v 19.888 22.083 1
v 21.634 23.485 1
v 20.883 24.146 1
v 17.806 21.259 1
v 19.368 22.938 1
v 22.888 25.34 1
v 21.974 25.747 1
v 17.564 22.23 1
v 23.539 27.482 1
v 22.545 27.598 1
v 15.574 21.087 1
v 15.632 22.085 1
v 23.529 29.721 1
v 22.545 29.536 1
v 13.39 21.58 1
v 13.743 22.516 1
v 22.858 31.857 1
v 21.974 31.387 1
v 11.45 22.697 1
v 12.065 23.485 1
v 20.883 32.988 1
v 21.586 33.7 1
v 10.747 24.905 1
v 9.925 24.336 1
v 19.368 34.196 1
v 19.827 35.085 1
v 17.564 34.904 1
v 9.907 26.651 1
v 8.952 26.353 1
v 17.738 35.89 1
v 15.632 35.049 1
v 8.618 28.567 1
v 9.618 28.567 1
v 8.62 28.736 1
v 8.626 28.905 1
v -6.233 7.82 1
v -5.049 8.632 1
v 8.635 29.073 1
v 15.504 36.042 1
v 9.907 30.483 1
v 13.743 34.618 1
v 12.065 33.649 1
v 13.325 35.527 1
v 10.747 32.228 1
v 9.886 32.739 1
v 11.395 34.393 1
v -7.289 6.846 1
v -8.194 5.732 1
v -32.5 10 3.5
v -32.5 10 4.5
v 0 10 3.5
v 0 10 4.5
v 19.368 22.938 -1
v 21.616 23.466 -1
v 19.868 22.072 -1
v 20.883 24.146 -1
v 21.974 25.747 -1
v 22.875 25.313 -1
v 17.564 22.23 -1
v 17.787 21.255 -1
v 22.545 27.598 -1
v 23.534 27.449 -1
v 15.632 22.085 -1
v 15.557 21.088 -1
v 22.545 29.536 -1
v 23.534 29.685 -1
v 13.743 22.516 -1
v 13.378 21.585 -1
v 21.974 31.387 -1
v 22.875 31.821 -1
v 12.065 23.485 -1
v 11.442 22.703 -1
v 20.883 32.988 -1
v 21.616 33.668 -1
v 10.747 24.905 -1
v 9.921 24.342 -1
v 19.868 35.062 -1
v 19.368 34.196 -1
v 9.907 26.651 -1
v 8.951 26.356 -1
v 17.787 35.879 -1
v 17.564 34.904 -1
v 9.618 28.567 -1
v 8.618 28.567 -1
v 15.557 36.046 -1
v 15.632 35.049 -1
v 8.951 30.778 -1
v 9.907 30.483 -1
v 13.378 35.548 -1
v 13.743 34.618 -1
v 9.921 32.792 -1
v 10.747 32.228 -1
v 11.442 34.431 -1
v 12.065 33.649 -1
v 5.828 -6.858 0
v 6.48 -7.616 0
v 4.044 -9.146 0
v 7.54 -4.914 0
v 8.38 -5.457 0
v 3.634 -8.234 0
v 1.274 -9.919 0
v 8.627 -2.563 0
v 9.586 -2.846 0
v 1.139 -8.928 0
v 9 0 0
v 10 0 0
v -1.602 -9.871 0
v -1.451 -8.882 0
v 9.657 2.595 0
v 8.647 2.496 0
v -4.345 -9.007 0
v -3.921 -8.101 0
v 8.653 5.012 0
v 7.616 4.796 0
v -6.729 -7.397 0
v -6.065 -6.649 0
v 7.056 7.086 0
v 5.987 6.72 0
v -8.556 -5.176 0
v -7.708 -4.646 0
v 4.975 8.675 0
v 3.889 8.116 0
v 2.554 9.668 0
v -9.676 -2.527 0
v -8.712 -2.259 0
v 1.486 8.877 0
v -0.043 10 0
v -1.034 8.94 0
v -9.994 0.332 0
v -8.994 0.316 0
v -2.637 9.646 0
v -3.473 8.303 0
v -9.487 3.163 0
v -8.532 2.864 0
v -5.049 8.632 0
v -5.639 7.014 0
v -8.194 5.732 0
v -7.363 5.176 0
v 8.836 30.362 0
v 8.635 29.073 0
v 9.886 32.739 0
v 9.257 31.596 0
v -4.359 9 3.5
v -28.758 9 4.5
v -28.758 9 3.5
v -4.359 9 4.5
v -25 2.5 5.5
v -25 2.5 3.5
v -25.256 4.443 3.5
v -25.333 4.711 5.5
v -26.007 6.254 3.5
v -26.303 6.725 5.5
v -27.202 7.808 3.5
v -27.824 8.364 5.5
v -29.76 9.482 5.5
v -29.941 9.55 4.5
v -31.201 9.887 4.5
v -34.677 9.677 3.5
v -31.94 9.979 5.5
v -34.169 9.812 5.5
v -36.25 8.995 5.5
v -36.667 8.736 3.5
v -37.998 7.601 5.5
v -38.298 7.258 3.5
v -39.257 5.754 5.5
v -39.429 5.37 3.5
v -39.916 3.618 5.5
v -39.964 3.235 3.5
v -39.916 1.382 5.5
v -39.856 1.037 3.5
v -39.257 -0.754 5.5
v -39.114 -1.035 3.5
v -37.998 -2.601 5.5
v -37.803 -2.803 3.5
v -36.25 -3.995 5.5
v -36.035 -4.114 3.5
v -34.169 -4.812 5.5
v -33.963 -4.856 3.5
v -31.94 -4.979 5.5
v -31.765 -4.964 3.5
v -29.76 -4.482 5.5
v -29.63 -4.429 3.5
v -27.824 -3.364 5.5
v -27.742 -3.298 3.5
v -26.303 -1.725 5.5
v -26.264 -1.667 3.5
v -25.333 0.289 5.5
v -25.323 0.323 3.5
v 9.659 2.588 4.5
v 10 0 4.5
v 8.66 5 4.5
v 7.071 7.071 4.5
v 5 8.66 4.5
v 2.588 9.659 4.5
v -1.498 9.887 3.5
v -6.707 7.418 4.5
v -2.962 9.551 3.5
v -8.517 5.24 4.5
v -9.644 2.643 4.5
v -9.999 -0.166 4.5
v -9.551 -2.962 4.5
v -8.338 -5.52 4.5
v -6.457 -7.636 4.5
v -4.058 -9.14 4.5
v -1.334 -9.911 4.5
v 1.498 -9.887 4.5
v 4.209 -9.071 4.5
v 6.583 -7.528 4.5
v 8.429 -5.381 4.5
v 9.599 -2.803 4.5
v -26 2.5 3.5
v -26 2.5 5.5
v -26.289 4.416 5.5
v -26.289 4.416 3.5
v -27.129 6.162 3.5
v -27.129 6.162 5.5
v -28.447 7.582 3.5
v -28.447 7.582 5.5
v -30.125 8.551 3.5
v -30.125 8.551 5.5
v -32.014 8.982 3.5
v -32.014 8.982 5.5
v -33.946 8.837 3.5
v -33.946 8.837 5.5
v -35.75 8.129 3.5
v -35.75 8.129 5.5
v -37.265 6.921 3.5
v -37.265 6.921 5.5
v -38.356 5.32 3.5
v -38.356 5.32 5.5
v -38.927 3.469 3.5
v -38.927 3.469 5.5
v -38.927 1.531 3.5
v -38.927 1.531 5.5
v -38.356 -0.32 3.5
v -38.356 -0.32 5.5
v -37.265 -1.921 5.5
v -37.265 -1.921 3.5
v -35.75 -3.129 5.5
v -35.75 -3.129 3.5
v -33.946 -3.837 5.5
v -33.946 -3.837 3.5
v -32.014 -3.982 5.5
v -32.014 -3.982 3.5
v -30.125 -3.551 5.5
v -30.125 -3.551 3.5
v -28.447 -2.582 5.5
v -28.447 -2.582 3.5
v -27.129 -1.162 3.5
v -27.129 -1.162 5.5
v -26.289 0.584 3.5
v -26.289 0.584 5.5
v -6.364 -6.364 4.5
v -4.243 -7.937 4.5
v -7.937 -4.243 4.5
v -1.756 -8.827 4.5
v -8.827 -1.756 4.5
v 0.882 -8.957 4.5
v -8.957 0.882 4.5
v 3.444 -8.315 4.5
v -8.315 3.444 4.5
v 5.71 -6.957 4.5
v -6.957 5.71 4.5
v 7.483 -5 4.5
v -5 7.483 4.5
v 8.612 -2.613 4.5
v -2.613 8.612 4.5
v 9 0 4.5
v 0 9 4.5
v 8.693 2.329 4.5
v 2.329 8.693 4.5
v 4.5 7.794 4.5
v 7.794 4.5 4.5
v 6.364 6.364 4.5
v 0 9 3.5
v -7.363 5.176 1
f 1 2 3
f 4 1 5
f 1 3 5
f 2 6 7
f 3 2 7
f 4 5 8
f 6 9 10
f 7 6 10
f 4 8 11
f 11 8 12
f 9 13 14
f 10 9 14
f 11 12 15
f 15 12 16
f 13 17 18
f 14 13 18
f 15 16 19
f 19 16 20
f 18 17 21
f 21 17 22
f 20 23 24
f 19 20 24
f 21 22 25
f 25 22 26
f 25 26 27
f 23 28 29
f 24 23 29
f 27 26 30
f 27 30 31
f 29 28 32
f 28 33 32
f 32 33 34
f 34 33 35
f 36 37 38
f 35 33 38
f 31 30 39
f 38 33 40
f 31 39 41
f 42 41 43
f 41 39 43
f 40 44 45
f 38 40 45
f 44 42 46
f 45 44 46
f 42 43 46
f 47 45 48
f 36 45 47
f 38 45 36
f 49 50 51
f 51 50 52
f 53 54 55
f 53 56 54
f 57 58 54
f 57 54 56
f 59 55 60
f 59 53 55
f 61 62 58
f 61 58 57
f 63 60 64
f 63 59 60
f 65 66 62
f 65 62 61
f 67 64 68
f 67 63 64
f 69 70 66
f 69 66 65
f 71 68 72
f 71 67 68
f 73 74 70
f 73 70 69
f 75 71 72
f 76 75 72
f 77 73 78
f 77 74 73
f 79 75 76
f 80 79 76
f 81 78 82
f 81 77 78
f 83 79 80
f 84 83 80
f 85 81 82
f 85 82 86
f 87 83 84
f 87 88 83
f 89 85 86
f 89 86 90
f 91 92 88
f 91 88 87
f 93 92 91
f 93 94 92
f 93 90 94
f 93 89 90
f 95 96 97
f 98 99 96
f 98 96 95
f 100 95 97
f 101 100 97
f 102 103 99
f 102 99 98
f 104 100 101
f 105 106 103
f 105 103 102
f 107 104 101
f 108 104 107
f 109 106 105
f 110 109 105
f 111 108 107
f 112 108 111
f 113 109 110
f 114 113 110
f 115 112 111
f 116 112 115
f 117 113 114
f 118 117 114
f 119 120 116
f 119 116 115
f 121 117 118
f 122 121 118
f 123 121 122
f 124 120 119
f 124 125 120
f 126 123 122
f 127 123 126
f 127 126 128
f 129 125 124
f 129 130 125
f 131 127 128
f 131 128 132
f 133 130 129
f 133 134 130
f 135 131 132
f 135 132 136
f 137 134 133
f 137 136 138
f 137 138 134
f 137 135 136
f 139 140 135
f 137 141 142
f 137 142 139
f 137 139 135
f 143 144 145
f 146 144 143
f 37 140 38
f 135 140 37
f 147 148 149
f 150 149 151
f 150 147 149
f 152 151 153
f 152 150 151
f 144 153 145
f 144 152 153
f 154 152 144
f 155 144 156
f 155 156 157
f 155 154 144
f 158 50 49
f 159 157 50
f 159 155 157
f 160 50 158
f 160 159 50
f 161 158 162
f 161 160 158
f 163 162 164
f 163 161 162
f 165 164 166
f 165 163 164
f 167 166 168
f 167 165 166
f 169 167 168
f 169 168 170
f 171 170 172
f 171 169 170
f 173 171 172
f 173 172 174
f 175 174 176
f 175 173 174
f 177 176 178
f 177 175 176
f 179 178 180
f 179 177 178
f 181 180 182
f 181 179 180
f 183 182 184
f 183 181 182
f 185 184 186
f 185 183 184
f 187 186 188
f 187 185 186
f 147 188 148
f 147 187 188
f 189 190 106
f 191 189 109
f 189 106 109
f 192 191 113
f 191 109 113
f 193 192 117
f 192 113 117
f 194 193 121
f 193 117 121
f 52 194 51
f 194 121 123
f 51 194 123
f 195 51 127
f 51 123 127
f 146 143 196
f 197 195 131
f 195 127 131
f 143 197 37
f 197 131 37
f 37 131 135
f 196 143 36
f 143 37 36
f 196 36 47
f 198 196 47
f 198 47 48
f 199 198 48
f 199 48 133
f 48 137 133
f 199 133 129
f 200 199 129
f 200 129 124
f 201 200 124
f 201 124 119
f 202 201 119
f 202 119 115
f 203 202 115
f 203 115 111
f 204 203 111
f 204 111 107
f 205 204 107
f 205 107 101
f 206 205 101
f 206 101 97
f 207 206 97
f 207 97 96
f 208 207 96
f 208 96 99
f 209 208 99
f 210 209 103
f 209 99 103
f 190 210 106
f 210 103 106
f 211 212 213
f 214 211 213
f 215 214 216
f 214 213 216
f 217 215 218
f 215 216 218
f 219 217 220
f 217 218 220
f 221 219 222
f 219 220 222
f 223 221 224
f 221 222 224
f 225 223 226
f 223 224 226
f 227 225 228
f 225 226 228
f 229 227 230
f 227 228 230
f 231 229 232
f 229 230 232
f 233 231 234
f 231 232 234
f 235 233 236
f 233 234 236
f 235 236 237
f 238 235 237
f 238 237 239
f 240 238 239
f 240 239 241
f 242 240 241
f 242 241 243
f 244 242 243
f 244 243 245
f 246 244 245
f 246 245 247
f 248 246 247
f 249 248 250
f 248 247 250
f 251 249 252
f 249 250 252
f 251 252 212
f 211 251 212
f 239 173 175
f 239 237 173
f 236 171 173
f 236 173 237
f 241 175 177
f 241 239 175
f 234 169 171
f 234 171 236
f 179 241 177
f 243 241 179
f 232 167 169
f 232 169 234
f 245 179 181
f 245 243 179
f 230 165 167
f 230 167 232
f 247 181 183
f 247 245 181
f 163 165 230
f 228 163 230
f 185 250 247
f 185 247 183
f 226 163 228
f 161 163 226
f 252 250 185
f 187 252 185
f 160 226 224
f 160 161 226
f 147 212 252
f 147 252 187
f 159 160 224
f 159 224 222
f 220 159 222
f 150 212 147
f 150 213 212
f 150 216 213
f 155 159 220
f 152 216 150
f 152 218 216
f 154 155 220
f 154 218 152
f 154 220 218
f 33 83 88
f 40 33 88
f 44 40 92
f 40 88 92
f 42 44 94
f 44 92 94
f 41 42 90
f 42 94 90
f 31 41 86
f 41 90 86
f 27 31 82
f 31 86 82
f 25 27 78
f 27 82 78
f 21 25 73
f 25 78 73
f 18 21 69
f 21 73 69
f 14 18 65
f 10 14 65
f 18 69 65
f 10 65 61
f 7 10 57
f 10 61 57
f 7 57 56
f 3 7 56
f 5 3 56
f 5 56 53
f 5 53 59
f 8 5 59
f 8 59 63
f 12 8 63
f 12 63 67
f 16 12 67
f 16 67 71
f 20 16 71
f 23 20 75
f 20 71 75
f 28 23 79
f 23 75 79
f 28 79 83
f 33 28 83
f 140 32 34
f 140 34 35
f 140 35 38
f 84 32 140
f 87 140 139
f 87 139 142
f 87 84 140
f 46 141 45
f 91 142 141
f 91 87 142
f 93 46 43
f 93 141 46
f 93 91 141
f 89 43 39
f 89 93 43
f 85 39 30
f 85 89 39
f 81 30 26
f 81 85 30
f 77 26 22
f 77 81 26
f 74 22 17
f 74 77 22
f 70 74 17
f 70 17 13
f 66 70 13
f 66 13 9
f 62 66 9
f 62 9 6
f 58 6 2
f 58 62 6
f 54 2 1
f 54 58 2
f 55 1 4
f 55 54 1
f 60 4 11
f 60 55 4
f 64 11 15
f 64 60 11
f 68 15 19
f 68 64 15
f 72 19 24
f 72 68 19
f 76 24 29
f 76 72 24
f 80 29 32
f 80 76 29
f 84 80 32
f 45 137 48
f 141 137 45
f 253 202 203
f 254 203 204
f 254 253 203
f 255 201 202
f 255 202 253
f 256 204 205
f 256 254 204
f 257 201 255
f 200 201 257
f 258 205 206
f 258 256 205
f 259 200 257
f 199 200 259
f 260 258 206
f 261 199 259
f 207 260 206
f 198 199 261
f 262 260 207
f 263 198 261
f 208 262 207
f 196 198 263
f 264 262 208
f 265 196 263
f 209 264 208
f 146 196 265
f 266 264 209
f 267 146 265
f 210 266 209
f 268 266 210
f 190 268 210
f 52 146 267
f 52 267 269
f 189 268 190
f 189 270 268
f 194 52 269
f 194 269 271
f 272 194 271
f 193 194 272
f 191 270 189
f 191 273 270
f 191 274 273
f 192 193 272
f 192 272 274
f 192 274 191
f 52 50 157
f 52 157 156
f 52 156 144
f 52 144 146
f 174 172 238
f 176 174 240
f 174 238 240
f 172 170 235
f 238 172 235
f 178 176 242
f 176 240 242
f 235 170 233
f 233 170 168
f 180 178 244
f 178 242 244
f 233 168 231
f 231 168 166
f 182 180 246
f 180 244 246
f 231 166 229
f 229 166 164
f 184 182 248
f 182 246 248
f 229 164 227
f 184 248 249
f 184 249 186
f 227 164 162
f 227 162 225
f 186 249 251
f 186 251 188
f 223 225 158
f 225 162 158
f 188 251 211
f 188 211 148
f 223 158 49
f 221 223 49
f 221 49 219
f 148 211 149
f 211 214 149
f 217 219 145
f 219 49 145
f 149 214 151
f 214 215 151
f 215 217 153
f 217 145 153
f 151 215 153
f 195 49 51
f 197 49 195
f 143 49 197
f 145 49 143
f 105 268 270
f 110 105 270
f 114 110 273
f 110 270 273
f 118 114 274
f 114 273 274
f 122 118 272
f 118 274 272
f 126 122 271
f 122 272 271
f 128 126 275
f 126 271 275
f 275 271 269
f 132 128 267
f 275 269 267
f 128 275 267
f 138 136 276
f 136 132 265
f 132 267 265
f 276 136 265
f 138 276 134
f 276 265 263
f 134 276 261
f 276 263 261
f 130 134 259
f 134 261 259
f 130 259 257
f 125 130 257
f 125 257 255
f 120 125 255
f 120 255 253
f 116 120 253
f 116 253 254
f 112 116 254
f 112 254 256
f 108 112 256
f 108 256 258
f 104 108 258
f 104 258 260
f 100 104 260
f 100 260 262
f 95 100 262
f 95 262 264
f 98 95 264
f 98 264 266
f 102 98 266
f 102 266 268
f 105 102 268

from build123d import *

# Parameters (mm, degrees)
SKETCH1_R           = 10
BOSS_EXTRUDE1_DEPTH = 4.5
SKETCH2_R           = 9
CUT_EXTRUDE1_DEPTH  = 4.5
SKETCH3_W           = 32.5
SKETCH3_H           = 1
BOSS_EXTRUDE2_DEPTH = 1
SKETCH5_R           = 7.5
BOSS_EXTRUDE3_DEPTH = 1
SKETCH6_R           = 6.5
CUT_EXTRUDE2_DEPTH  = 2
BOSS_EXTRUDE4_DEPTH = 1
SKETCH9_R           = 7.5
BOSS_EXTRUDE5_DEPTH = 1
SKETCH10_R          = 6.5
CUT_EXTRUDE3_DEPTH  = 2


with BuildPart() as part:
    # Sketch1 → Boss-Extrude1 (new body)
    with BuildSketch(Plane.XY):
        Circle(SKETCH1_R)
    extrude(amount=BOSS_EXTRUDE1_DEPTH)

    # Sketch2 → Cut-Extrude1 (cut)
    with BuildSketch(Plane.XY.offset(4.5)):
        Circle(SKETCH2_R)
    extrude(amount=-CUT_EXTRUDE1_DEPTH, mode=Mode.SUBTRACT)

    # Sketch3 → Boss-Extrude2 (add)
    with BuildSketch(Plane.XY.offset(4.5)):
        with Locations((-16.25, 9.5)):
            Rectangle(SKETCH3_W, SKETCH3_H)
    extrude(amount=-BOSS_EXTRUDE2_DEPTH)

    # Sketch5 → Boss-Extrude3 (add, symmetric)
    with BuildSketch(Plane.XY.offset(4.5)):
        with Locations((-32.5, 2.5)):
            Circle(SKETCH5_R)
    extrude(amount=BOSS_EXTRUDE3_DEPTH, both=True)

    # Sketch6 → Cut-Extrude2 (cut)
    with BuildSketch(Plane.XY.offset(5.5)):
        with Locations((-32.5, 2.5)):
            Circle(SKETCH6_R)
    extrude(amount=-CUT_EXTRUDE2_DEPTH, mode=Mode.SUBTRACT)

    # Sketch8 → Boss-Extrude4 (add)
    with BuildSketch(Plane(origin=(0, 0, 0), x_dir=(-1, 0, 0), z_dir=(0, 0, -1))):
        Polygon((8.194096935, 5.732082992), (-9.885510569, 32.739078243), (-10.716495038, 32.182782628), (7.362918515, 5.175657537), align=None)
    extrude(amount=-BOSS_EXTRUDE4_DEPTH)

    # Sketch9 → Boss-Extrude5 (add, symmetric)
    with BuildSketch(Plane(origin=(0, 0, 0), x_dir=(-1, 0, 0), z_dir=(0, 0, -1))):
        with Locations((-16.117894088, 28.566861127)):
            Circle(SKETCH9_R)
    extrude(amount=BOSS_EXTRUDE5_DEPTH, both=True)

    # Sketch10 → Cut-Extrude3 (cut)
    with BuildSketch(Plane(origin=(0, 0, -1), x_dir=(-1, 0, 0), z_dir=(0, 0, -1))):
        with Locations((-16.117894088, 28.566861127)):
            Circle(SKETCH10_R)
    extrude(amount=-CUT_EXTRUDE3_DEPTH, mode=Mode.SUBTRACT)


solid = part.part
